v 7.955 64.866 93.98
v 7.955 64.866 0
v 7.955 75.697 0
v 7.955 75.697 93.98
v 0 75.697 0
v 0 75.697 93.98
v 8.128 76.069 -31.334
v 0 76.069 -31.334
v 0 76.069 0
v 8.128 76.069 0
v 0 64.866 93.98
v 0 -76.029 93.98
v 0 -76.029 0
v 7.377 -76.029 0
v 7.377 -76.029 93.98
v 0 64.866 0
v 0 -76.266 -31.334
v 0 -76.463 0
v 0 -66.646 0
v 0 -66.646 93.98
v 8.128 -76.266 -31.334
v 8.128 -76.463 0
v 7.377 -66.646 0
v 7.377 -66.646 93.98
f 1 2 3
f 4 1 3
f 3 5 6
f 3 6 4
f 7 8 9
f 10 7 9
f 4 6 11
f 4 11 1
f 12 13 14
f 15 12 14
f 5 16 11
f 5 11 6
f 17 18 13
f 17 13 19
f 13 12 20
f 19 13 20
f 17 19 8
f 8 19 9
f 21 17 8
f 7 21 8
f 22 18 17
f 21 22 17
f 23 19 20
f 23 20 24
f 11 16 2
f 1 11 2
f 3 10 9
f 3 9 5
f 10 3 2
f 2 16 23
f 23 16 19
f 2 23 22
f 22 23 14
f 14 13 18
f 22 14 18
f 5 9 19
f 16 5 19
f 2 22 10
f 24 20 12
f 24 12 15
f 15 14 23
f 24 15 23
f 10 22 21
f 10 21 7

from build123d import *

# Parameters (mm, degrees)
F1_DEPTH = 8.128
F2_W     = 7.37743
F2_H     = 9.382971
F2_W_2   = 7.954949
F2_H_2   = 10.831244
F3_DEPTH = 93.98


with BuildPart() as f1:
    # F0 (on Right) → F1 (new body)
    with BuildSketch(Plane.YZ):
        Polygon((76.068617, 0), (-76.462761, 0), (-76.265693, -31.333964), (76.068617, -31.333964), align=None)
    extrude(amount=F1_DEPTH)

    # F2 (on Top) → F3 (join)
    with BuildSketch(Plane.XY):
        with Locations((3.688715, -71.337815)):
            Rectangle(F2_W, F2_H)
        with Locations((3.977475, 70.281338)):
            Rectangle(F2_W_2, F2_H_2)
    extrude(amount=F3_DEPTH)


solid = f1.part
